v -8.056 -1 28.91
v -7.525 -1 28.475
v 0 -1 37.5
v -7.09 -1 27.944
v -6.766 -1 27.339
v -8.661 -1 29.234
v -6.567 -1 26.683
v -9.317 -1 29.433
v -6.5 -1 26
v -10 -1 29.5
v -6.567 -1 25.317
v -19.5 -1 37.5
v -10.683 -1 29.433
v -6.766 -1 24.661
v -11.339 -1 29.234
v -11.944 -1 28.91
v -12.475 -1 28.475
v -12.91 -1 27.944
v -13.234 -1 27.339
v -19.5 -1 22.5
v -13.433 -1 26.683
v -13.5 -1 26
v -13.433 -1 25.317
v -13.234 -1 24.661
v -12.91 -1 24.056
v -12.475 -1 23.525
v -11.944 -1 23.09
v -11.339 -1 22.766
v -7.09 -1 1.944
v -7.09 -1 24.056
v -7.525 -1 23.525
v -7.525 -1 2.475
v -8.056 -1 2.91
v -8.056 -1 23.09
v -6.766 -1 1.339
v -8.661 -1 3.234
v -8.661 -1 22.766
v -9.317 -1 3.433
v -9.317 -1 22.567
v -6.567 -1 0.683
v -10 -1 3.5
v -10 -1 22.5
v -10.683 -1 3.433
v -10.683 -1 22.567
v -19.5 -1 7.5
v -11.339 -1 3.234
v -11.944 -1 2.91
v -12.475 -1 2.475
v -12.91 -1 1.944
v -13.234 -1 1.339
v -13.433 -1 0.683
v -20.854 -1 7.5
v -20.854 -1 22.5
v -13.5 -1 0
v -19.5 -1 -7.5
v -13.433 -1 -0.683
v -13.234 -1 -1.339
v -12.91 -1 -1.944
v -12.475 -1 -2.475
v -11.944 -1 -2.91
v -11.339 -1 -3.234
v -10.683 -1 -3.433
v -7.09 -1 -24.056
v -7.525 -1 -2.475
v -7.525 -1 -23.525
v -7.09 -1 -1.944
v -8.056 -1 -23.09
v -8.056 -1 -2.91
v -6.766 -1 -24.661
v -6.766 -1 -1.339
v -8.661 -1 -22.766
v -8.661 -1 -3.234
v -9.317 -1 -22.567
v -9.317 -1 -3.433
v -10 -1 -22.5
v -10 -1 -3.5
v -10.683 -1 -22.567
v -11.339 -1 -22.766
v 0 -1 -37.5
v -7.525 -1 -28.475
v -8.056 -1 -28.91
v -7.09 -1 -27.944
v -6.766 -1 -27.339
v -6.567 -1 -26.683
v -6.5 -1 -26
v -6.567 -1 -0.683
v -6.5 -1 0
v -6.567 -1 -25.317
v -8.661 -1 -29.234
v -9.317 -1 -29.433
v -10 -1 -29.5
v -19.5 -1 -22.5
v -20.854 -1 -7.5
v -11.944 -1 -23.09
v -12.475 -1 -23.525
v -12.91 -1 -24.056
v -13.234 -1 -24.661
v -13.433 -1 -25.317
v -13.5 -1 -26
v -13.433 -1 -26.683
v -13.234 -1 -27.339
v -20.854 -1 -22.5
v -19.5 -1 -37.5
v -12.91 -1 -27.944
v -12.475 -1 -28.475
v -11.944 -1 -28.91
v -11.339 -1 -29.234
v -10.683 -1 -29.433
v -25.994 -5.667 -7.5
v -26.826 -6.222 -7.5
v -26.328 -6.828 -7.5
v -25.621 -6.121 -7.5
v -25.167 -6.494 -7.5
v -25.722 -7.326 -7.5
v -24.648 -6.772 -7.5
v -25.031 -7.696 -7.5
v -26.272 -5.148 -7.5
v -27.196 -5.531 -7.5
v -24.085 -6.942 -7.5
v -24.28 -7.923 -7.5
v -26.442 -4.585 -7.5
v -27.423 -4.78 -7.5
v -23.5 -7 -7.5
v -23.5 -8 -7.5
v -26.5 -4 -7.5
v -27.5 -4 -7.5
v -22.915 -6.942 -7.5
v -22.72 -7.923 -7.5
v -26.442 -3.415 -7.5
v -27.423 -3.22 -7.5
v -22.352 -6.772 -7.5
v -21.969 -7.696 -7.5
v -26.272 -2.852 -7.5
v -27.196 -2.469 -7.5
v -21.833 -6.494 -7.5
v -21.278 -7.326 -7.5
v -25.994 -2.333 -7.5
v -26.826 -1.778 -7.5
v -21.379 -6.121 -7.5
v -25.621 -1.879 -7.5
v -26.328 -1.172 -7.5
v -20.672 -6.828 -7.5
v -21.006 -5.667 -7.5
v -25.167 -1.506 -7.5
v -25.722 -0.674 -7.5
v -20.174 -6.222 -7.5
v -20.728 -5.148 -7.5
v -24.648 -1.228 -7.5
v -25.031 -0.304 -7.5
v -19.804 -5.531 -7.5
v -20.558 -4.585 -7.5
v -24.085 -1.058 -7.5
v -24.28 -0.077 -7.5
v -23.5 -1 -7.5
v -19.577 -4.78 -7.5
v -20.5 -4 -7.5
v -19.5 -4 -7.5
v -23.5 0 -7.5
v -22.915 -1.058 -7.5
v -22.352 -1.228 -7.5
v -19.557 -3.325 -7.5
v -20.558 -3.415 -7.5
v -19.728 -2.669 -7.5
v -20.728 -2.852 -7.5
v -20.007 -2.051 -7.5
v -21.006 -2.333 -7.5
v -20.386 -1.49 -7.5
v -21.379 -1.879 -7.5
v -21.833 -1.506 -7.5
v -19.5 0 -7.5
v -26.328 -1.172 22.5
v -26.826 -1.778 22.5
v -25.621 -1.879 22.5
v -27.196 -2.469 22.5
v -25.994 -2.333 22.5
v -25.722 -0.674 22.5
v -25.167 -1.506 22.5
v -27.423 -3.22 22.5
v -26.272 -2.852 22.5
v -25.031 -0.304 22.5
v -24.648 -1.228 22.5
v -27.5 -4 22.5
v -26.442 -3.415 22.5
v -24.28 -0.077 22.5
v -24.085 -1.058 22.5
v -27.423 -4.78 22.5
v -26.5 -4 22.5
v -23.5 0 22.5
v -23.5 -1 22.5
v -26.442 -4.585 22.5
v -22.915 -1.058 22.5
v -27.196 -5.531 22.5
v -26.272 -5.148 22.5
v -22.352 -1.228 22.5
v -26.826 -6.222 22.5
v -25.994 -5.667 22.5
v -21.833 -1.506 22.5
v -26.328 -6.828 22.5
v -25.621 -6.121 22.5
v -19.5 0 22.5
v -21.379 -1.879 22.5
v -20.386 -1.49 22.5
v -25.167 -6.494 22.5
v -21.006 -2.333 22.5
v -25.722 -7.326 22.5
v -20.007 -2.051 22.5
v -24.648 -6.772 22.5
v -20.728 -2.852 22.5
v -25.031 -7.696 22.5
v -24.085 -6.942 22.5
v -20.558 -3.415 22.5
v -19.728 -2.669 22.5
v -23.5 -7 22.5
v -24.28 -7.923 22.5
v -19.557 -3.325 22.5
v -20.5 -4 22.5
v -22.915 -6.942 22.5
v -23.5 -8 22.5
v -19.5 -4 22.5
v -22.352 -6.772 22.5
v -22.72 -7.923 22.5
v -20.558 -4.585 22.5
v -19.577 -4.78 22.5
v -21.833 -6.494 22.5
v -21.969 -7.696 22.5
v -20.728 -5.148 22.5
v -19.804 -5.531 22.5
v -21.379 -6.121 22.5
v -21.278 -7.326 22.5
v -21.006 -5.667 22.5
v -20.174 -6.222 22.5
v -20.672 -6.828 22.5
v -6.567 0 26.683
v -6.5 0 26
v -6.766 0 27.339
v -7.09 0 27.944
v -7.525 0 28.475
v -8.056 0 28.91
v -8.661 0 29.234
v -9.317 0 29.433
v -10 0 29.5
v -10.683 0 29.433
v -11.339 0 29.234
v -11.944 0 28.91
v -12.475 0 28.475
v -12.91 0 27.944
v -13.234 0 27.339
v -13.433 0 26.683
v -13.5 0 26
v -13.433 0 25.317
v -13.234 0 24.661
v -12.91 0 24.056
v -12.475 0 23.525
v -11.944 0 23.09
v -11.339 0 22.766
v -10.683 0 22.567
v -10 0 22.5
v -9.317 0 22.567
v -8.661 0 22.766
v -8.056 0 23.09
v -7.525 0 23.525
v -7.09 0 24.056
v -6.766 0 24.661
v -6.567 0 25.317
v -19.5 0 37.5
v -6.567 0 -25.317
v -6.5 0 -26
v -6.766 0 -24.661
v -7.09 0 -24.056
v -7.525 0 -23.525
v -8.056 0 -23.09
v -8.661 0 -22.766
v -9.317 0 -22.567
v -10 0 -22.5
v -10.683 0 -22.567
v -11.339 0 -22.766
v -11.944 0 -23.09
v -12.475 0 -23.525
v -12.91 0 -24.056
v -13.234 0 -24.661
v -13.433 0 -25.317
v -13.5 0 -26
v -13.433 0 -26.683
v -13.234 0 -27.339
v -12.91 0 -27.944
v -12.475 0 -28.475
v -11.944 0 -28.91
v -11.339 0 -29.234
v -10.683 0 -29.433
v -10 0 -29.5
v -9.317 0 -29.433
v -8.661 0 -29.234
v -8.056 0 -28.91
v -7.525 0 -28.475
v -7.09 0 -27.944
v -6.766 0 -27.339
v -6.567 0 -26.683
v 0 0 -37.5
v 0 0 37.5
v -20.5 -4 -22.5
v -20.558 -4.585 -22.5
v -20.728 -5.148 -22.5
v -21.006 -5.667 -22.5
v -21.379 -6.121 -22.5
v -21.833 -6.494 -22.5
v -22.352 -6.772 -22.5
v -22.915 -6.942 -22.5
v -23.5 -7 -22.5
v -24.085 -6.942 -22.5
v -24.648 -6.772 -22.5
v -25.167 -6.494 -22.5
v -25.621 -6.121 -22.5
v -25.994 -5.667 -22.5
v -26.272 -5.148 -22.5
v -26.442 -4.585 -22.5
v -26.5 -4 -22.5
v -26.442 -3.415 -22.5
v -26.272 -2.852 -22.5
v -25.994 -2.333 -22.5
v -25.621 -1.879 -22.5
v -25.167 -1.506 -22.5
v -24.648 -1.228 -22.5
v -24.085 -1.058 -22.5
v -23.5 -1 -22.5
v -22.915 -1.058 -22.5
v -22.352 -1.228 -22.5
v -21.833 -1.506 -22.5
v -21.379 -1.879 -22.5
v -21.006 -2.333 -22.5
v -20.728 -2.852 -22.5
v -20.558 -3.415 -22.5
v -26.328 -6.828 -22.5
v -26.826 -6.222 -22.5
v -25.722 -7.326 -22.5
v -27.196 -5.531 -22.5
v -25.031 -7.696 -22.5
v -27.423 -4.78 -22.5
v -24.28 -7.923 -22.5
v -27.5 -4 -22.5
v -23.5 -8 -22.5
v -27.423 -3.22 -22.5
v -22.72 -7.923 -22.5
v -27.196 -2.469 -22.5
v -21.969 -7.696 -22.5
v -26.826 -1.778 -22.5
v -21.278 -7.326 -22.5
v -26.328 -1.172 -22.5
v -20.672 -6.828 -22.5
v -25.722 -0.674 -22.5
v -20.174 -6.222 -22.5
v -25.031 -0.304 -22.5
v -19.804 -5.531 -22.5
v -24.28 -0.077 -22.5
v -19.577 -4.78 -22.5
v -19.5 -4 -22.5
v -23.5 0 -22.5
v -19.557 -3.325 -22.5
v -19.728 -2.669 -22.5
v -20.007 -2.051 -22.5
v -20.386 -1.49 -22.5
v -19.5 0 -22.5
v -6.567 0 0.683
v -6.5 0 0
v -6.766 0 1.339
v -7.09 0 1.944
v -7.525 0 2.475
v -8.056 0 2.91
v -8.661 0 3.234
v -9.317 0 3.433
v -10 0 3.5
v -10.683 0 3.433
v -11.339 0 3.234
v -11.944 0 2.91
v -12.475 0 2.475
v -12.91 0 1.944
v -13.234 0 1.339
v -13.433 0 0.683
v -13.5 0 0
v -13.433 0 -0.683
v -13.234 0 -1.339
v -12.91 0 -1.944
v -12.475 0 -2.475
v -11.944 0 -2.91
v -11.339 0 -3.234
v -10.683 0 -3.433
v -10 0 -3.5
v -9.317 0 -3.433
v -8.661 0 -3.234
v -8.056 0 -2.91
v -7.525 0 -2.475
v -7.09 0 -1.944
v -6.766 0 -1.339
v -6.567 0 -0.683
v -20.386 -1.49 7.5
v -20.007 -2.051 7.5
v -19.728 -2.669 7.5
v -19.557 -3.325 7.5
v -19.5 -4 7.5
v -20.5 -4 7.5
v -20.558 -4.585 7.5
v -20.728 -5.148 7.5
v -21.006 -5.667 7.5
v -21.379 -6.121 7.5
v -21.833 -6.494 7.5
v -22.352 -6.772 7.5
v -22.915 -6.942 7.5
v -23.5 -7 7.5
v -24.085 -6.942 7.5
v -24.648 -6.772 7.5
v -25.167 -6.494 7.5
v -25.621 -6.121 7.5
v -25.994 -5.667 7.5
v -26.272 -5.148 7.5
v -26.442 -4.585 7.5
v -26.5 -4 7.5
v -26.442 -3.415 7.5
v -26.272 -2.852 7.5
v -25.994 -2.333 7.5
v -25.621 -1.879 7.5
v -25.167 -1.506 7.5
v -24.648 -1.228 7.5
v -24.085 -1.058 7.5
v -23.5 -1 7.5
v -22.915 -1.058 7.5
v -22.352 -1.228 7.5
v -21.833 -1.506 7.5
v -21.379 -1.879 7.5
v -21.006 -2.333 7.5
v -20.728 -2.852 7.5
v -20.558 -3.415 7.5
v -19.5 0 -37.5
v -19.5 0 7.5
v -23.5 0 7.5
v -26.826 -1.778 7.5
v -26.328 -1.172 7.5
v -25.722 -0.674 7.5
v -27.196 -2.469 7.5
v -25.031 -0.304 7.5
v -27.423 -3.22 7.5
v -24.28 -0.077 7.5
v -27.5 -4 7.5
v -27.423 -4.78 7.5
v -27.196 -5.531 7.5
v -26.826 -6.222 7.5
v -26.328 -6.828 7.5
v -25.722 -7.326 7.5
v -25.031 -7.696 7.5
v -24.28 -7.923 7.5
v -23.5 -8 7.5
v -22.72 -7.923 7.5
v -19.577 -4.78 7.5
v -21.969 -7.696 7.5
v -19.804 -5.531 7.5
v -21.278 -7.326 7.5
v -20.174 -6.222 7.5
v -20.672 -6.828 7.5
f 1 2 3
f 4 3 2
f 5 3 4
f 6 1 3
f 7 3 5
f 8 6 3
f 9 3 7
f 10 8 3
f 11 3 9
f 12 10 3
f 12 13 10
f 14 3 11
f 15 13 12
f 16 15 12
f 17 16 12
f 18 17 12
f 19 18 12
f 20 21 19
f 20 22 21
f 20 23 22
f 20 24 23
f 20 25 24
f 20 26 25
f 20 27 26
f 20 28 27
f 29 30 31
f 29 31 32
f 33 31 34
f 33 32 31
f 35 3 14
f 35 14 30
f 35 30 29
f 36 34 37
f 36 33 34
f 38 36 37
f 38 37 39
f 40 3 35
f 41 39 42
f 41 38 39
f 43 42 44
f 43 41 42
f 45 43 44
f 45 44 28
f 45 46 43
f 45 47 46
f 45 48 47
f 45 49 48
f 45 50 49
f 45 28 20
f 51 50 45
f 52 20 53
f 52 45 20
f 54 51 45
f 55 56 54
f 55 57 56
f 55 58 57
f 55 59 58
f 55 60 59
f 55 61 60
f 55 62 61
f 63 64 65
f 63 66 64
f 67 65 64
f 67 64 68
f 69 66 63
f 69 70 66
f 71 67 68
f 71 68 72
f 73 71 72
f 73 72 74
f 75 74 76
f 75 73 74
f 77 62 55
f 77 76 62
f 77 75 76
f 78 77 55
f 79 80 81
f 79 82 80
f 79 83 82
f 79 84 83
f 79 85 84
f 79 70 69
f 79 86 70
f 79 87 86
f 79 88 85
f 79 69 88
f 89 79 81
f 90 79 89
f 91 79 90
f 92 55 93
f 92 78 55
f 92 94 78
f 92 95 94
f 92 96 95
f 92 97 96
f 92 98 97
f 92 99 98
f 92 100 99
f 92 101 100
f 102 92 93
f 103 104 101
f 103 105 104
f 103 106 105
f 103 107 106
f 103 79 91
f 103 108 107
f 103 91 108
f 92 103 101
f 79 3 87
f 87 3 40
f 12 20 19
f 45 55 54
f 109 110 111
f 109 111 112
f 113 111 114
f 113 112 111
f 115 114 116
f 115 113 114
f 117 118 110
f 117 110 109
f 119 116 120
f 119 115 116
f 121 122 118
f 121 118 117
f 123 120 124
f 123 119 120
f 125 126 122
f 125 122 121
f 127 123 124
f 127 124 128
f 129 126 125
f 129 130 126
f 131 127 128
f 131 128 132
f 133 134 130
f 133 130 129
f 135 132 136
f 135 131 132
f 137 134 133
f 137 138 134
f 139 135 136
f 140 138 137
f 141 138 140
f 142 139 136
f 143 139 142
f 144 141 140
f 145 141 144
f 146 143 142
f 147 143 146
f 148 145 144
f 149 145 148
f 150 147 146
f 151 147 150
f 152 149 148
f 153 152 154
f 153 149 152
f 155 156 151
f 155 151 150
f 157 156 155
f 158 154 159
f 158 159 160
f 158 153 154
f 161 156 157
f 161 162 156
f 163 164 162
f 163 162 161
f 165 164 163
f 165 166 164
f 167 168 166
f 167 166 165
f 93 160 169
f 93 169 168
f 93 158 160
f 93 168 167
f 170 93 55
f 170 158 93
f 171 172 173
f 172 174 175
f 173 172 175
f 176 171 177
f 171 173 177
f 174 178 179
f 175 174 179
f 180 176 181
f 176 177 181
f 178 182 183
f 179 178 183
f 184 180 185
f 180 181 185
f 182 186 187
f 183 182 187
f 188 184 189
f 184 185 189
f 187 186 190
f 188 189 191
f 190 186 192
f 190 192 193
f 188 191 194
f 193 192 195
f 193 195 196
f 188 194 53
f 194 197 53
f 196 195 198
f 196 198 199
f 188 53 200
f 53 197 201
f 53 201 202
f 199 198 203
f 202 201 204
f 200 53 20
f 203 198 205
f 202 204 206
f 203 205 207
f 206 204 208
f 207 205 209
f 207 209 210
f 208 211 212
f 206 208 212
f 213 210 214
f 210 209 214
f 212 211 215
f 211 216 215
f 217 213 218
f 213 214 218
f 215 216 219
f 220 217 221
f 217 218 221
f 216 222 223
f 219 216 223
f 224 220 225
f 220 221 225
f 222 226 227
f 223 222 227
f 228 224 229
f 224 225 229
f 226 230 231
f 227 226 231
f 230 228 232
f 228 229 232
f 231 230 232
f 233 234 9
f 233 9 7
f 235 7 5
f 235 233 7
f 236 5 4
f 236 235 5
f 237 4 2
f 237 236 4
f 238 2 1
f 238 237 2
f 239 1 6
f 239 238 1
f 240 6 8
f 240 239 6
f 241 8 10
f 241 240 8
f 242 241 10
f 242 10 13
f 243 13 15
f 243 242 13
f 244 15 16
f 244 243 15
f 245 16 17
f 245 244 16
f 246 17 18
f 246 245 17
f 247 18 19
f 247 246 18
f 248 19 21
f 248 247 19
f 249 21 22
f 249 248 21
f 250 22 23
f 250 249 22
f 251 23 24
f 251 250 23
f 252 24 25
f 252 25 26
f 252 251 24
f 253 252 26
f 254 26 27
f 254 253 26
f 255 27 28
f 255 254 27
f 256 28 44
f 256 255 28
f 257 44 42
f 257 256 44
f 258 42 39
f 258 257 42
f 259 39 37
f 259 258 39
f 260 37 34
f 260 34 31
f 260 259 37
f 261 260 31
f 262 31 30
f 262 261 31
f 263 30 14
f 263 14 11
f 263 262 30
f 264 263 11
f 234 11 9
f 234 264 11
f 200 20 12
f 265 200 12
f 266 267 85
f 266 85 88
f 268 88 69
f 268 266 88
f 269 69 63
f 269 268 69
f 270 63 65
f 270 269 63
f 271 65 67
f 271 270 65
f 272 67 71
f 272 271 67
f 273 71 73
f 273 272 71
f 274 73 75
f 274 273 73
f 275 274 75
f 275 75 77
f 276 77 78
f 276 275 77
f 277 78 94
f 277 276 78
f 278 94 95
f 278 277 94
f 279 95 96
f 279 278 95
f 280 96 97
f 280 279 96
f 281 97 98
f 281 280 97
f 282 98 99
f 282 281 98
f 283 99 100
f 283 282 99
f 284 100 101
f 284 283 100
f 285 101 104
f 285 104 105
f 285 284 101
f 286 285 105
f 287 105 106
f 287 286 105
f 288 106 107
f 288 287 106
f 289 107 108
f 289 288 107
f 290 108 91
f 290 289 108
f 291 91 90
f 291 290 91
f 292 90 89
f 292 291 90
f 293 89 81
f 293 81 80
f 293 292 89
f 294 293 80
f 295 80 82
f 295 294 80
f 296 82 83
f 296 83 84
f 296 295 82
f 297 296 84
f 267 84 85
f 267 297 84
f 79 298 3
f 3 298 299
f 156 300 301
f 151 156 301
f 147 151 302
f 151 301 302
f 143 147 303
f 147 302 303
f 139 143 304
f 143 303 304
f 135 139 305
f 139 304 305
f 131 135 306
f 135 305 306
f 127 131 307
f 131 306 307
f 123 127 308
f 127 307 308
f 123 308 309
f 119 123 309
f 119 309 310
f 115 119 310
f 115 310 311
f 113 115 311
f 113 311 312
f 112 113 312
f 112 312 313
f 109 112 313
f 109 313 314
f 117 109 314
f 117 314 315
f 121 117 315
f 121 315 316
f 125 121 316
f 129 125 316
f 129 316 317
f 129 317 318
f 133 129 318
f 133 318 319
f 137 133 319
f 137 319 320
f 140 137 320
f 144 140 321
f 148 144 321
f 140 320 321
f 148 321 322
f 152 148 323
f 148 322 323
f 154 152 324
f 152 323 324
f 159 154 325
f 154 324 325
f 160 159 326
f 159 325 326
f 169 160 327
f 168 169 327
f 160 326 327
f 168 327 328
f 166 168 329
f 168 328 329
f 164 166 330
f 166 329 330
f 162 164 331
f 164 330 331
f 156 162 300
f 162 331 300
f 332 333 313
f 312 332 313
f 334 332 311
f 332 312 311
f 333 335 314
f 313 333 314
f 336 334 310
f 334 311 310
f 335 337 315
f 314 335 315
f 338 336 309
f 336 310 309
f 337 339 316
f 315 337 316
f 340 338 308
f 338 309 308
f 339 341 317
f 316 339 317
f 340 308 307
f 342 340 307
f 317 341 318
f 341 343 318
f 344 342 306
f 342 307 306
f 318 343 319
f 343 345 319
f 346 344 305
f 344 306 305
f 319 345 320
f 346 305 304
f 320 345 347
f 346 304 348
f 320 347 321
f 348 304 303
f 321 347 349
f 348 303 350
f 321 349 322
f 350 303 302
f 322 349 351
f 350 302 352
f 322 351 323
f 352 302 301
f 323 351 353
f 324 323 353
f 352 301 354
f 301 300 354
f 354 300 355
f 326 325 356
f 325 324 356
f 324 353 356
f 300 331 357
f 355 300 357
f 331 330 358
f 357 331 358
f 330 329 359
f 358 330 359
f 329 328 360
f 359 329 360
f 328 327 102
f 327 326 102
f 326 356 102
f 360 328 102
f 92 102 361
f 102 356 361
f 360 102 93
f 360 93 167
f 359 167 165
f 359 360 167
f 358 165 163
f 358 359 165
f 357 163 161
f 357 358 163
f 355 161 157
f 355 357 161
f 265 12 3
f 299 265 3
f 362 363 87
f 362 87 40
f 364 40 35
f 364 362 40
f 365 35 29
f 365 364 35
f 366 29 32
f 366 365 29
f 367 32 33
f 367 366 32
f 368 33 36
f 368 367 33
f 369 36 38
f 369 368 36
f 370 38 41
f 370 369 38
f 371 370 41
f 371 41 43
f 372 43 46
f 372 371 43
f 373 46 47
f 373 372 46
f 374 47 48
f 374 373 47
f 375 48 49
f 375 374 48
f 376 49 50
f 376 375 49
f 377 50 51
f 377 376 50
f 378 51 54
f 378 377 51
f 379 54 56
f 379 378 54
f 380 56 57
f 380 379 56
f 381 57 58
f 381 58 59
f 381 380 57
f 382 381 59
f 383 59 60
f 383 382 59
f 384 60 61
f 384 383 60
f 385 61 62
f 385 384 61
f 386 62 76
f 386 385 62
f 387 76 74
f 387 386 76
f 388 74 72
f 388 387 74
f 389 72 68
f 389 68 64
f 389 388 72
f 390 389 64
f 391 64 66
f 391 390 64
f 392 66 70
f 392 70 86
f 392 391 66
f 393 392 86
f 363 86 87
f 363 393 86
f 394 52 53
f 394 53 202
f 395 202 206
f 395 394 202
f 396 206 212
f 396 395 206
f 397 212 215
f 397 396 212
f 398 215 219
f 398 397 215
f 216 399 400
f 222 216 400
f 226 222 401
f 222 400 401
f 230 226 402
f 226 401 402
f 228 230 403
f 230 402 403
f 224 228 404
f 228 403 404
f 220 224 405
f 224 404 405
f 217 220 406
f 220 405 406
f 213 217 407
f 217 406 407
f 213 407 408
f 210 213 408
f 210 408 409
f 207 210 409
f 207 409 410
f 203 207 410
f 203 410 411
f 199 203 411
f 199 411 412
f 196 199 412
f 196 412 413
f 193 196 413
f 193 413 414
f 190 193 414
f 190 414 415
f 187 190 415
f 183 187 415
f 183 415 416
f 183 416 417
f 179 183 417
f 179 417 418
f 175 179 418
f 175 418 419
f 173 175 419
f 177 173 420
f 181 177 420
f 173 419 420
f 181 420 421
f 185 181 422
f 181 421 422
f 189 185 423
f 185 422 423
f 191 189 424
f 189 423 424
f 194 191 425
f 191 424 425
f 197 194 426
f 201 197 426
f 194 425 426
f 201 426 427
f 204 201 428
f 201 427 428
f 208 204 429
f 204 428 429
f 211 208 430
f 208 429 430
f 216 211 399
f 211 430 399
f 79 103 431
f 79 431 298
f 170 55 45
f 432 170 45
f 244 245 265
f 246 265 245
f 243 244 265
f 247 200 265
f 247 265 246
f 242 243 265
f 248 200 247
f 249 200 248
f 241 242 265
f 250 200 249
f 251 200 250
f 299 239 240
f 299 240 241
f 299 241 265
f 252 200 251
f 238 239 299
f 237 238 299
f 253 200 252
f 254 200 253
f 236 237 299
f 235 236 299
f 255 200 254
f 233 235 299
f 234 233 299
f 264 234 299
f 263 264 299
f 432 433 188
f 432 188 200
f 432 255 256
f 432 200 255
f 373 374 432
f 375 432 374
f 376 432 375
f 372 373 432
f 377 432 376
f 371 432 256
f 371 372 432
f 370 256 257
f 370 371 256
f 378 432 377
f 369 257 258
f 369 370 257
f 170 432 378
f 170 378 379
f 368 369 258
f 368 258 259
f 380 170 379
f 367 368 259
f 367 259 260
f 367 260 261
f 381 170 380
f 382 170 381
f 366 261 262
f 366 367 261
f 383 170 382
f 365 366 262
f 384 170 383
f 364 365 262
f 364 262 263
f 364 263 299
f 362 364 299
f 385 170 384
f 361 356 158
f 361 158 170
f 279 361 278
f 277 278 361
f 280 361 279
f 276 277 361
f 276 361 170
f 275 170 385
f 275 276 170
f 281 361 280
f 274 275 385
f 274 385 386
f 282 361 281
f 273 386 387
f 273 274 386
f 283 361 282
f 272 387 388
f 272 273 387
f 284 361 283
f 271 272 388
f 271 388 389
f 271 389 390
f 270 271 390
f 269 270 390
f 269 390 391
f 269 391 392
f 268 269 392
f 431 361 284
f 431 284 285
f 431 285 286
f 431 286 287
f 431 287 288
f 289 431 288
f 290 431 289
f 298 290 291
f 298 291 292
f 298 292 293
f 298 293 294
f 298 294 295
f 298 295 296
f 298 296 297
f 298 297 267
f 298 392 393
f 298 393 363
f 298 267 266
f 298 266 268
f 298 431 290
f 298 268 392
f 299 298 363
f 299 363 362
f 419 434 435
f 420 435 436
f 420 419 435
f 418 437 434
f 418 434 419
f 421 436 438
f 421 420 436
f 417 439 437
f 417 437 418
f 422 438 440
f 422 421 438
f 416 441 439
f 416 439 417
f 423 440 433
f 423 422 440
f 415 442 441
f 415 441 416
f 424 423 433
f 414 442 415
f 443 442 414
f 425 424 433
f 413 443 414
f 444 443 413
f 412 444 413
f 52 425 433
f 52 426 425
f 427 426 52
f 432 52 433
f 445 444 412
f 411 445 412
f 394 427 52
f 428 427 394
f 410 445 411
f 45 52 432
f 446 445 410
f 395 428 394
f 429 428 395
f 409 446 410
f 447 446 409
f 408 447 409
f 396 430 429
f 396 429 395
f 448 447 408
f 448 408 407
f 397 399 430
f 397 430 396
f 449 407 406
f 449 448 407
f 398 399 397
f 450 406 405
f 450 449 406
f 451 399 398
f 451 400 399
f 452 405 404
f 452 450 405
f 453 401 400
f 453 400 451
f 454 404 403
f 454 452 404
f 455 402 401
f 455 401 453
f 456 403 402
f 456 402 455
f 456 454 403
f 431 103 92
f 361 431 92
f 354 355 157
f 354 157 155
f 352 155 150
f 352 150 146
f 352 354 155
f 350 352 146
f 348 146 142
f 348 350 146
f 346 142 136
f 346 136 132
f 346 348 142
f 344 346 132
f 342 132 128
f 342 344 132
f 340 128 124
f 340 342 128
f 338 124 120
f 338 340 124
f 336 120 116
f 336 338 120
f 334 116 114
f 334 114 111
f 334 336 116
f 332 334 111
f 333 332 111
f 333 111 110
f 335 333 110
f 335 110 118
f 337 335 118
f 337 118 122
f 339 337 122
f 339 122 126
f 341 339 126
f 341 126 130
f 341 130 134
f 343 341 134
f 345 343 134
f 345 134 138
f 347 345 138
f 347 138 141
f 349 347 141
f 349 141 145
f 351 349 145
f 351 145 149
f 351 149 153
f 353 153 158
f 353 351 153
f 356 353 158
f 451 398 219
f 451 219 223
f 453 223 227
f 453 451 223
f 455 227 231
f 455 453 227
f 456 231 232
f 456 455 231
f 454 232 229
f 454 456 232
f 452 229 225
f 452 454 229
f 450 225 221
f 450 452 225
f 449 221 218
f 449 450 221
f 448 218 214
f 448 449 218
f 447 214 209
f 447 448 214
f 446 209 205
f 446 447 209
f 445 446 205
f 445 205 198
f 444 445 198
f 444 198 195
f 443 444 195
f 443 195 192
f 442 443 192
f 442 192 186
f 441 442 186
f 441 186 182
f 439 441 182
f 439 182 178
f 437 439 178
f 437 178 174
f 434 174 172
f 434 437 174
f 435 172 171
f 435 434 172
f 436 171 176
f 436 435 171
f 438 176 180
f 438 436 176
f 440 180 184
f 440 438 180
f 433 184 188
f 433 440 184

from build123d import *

# Parameters (mm, degrees)
F0_W          = 20
F0_H          = 75
F0_R          = 3.5
F1_DEPTH      = 1
F2_R          = 3
F3_DEPTH      = 75
F4_W          = 8
F4_H          = 15
F5_DEPTH      = 1.001
F5_DEPTH_BACK = 7.001


with BuildPart() as f1:
    # F0 (on Front) → F1 (new body)
    with BuildSketch(Plane.XZ):
        with Locations((-10, 0)):
            Rectangle(F0_W, F0_H)
        with Locations((-10, -26)):
            Circle(F0_R, mode=Mode.SUBTRACT)
        with Locations((-10, 0)):
            Circle(F0_R, mode=Mode.SUBTRACT)
        with Locations((-10, 26)):
            Circle(F0_R, mode=Mode.SUBTRACT)
    extrude(amount=F1_DEPTH)

    # F2 (on face) → F3 (join, through all)
    with BuildSketch(Plane(origin=(0, 0, -37.5), x_dir=(1, 0, 0), z_dir=(0, 0, -1))):
        with BuildLine():
            ThreePointArc((-20.8542486889, 1), (-19.8542486889, 2.3542486889), (-19.5, 4))
            ThreePointArc((-19.5, 4), (-26.3284271247, 6.8284271247), (-23.5, 0))
            ThreePointArc((-23.5, 0), (-22.0857864376, 0.2583426132), (-20.8542486889, 1))
        make_face()
        with Locations((-23.5, 4)):
            Circle(F2_R, mode=Mode.SUBTRACT)
        with BuildLine():
            ThreePointArc((-20.8542486889, 1), (-22.0857864376, 0.2583426132), (-23.5, 0))
            Line((-23.5, 0), (-20, 0))
            Line((-20, 0), (-20, 1))
            Line((-20, 1), (-20.8542486889, 1))
        make_face()
    extrude(amount=-F3_DEPTH)

    # F4 (on face) → F5 (cut, two sides)
    with BuildSketch(Plane.XZ.offset(1)) as f5_sk:
        with Locations((-23.5, 30)):
            Rectangle(F4_W, F4_H)
        with Locations((-23.5, -30)):
            Rectangle(F4_W, F4_H)
        with Locations((-23.5, 0)):
            Rectangle(F4_W, F4_H)
    extrude(amount=-F5_DEPTH, mode=Mode.SUBTRACT)
    extrude(f5_sk.sketch, amount=F5_DEPTH_BACK, mode=Mode.SUBTRACT)


solid = f1.part
